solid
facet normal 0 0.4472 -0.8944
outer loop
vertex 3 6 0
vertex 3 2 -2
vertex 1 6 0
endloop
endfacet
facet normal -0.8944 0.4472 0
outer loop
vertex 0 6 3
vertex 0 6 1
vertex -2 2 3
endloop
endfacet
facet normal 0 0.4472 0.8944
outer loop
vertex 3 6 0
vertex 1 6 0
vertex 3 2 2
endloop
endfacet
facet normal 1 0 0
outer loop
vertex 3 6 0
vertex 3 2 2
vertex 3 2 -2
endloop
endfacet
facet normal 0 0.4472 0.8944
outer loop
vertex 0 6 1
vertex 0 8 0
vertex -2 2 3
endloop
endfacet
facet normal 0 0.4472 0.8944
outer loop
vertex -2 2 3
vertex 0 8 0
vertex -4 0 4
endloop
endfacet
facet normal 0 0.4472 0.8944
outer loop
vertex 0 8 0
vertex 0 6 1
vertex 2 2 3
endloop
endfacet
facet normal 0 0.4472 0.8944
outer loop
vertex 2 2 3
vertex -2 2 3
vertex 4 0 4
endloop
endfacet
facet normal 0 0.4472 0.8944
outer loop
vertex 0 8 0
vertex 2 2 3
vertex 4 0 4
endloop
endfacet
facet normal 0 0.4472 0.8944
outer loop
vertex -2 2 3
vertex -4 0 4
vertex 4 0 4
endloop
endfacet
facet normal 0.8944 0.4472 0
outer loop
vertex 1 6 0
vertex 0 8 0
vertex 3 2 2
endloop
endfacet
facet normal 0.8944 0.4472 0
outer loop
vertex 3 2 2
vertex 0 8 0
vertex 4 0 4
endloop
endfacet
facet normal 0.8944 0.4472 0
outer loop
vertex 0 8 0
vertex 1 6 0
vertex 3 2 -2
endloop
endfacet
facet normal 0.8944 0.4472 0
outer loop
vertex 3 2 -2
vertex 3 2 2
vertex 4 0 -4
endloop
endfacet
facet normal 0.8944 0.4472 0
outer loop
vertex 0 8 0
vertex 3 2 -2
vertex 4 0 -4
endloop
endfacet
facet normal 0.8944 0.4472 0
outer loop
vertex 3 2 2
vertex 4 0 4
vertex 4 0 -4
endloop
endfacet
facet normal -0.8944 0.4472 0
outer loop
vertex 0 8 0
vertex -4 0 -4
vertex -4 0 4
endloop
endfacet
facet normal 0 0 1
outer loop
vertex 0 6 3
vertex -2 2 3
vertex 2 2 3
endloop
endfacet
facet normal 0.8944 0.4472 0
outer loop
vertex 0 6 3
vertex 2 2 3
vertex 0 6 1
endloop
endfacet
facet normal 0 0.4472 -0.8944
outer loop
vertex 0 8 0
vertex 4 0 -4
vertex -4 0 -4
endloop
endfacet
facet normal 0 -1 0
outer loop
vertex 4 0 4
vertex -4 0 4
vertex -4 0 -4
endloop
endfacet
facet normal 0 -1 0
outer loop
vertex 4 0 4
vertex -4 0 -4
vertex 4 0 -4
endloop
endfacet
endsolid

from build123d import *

# Parameters (mm, degrees)
SKETCH1_W             = 8
SKETCH1_H             = 8
BOSS_EXTRUDE1_DEPTH   = 3
BODY_MOVE_COPY1_ANGLE = 90


with BuildPart() as part:
    # Sketch1 → Loft1 section 0
    with BuildSketch(Plane(origin=(0, 0, 0), x_dir=(1, 0, 0), z_dir=(0, 1, 0)), mode=Mode.PRIVATE) as loft1_s0:
        Rectangle(SKETCH1_W, SKETCH1_H)
    loft([Vertex(0, 8, 0), loft1_s0.sketch])


with BuildPart() as body_2:
    # Sketch5 → Boss-Extrude1 (new body)
    with BuildSketch(Plane.XY):
        Polygon((0, 6), (-2, 2), (2, 2), align=None)
    extrude(amount=BOSS_EXTRUDE1_DEPTH)


with BuildPart() as body_3:
    # Body-Move/Copy1: copy of body 2
    add(body_2.part.rotate(Axis((0, 0, 0), (0, 1, 0)), BODY_MOVE_COPY1_ANGLE))


with BuildPart() as part_1:
    add(part.part)

    # Combine1: union body 2, body 3
    add(body_2.part)
    add(body_3.part)


solid = part_1.part
